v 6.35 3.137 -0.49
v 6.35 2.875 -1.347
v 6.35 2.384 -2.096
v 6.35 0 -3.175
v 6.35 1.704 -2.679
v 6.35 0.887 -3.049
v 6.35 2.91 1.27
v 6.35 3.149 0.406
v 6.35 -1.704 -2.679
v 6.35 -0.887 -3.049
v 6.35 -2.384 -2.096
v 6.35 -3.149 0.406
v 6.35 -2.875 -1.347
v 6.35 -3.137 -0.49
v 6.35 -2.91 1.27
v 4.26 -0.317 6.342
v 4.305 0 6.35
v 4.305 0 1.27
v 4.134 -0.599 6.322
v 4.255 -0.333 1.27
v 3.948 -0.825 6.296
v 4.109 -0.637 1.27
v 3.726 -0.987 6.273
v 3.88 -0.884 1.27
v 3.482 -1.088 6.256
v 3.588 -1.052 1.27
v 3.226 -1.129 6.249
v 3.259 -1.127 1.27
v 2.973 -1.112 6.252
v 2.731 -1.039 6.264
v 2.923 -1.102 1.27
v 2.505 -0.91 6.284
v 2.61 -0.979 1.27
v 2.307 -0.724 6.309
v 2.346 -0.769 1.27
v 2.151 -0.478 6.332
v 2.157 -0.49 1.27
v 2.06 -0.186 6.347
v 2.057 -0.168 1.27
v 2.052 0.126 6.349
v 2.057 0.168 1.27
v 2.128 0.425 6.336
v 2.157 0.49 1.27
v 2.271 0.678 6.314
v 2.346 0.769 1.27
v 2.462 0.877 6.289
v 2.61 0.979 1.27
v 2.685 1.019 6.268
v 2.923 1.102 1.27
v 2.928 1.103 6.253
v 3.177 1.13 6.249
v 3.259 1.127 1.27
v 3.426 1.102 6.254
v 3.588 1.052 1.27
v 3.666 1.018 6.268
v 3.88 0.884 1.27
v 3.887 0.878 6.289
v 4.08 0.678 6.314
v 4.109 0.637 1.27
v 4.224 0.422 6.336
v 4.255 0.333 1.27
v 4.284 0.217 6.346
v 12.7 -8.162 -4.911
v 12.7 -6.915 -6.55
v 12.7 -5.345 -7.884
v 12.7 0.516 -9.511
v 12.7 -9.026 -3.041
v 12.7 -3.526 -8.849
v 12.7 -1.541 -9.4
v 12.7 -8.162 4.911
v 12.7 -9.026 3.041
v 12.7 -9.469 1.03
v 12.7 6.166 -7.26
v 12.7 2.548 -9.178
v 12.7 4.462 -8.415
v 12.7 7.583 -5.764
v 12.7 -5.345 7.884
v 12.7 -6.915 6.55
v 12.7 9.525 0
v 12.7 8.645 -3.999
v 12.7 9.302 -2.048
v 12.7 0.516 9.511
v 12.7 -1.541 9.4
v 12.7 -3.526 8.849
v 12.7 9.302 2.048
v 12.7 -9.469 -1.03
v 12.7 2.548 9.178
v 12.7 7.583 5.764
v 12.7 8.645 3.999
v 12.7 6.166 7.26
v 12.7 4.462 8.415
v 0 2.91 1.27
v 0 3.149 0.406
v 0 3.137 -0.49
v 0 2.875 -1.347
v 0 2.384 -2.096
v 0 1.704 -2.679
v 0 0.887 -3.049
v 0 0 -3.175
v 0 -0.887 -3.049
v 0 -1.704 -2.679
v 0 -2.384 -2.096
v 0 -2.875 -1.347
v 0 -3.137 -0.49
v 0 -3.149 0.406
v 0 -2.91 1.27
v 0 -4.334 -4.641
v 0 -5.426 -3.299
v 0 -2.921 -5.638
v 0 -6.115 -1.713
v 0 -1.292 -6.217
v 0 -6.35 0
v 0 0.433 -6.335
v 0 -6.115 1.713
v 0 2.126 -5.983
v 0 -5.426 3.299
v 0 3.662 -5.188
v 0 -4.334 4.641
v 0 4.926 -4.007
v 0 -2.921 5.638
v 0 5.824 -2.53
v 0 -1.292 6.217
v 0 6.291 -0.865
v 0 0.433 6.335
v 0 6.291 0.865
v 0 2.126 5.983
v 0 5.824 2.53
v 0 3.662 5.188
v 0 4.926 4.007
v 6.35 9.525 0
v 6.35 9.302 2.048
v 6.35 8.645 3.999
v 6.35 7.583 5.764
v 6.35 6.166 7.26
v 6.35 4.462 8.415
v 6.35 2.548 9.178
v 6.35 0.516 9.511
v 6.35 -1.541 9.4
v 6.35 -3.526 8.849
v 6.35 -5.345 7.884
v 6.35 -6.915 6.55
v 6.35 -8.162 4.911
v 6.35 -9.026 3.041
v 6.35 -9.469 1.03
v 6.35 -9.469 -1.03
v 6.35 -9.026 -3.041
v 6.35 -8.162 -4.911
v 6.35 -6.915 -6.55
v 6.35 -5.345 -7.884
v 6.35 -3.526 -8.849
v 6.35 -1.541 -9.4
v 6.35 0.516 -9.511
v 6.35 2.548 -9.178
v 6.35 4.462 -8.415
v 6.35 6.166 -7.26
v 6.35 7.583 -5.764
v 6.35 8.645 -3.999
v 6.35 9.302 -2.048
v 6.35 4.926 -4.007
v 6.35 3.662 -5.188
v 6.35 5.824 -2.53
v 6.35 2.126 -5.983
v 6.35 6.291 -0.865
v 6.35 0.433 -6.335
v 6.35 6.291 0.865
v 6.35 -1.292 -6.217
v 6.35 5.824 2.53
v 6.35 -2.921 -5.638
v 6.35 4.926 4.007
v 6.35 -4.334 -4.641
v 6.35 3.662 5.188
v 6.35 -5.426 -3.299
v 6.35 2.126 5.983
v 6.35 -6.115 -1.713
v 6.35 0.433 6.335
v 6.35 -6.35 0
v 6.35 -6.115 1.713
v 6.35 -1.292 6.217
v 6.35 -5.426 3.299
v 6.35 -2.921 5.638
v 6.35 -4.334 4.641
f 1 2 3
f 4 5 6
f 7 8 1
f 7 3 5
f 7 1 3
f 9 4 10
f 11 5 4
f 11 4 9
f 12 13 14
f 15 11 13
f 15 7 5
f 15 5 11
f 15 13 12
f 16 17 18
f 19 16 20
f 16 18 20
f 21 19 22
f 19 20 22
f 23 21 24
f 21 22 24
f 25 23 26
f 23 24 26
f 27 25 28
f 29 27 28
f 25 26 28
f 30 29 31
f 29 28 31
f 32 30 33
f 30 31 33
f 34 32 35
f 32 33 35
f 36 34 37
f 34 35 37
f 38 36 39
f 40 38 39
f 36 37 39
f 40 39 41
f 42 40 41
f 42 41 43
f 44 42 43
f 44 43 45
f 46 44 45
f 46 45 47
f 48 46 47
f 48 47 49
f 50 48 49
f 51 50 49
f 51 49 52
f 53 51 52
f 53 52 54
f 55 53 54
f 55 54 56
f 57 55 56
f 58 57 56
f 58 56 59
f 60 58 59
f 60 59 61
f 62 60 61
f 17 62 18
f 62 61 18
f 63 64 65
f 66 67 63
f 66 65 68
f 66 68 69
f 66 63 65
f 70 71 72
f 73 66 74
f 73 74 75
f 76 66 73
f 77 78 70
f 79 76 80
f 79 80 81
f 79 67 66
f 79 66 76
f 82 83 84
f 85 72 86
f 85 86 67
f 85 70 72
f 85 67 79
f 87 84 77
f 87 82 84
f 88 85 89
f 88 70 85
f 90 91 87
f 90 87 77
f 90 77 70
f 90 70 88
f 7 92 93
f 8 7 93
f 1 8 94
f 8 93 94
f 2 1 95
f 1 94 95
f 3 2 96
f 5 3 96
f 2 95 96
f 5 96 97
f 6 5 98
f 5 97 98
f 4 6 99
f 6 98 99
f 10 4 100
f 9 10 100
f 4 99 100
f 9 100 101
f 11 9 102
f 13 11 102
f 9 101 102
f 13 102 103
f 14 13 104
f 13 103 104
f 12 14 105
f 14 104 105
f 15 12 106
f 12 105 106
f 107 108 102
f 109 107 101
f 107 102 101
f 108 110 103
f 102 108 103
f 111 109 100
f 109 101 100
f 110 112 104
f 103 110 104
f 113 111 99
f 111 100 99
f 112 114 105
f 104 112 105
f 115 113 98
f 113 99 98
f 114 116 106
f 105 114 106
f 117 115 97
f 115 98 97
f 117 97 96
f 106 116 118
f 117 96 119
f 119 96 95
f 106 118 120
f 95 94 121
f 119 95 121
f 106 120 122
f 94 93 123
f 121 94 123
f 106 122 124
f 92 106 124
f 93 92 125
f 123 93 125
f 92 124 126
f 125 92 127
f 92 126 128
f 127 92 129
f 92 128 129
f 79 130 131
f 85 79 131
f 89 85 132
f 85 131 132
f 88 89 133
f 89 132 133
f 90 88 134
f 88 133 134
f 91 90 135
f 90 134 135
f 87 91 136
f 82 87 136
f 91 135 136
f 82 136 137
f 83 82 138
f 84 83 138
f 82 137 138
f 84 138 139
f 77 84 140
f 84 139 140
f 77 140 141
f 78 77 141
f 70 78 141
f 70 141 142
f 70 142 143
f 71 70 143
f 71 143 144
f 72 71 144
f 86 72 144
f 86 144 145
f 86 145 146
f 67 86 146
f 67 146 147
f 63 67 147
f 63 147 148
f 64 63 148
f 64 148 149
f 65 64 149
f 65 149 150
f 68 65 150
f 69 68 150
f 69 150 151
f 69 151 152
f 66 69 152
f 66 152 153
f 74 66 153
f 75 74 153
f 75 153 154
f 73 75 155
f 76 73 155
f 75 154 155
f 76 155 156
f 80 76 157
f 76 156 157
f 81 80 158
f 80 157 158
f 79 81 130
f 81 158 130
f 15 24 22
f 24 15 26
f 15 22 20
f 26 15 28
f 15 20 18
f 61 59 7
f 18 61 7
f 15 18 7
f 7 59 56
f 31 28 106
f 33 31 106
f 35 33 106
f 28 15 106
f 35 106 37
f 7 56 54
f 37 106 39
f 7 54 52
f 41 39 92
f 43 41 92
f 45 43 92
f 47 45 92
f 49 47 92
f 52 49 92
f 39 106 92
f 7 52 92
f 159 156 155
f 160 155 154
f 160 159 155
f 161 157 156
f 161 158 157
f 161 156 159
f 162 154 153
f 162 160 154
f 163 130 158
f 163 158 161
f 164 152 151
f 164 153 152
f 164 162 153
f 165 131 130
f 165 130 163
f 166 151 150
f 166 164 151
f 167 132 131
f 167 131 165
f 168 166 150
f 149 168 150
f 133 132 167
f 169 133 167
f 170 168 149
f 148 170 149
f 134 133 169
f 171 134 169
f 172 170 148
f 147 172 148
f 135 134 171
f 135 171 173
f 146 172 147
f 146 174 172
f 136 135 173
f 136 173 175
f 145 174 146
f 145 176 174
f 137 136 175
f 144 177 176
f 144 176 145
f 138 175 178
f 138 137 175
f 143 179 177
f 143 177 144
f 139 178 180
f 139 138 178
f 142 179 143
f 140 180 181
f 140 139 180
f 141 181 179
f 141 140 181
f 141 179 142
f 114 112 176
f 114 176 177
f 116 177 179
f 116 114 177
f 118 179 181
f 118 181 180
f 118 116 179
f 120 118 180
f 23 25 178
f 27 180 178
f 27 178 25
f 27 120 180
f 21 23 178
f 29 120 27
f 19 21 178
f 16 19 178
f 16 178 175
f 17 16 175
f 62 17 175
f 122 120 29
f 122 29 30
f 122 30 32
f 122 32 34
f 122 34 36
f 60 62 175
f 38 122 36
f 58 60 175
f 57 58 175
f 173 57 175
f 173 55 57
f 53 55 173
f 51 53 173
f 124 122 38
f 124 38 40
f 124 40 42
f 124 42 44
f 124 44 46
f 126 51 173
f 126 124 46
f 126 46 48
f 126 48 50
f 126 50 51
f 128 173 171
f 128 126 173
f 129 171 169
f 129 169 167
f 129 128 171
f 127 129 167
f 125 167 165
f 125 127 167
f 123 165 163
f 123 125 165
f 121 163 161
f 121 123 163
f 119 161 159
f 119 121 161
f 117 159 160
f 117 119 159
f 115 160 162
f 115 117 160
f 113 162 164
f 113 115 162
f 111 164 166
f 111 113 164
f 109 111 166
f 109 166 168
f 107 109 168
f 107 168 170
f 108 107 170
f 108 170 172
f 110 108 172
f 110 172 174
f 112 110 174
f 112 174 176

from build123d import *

# Parameters (mm, degrees)
F0_R     = 9.525
F1_DEPTH = 12.7
F2_R     = 9.525
F2_R_2   = 6.35
F3_DEPTH = 6.35
F5_DEPTH = 6.35
F7_D     = 2.2606
F7_DEPTH = 8.256


with BuildPart() as f1:
    # F0 (on Right) → F1 (new body)
    with BuildSketch(Plane.YZ):
        Circle(F0_R)
    extrude(amount=F1_DEPTH)

    # F2 (on face) → F3 (cut)
    with BuildSketch(Plane(origin=(0, 0, 0), x_dir=(0, -1, 0), z_dir=(-1, 0, 0))):
        Circle(F2_R)
        Circle(F2_R_2, mode=Mode.SUBTRACT)
    extrude(amount=-F3_DEPTH, mode=Mode.SUBTRACT)

    # F4 (on face) → F5 (cut)
    with BuildSketch(Plane(origin=(0, 0, 0), x_dir=(0, -1, 0), z_dir=(-1, 0, 0))):
        with BuildLine():
            Line((2.9099355663, 1.27), (-2.9099355663, 1.27))
            ThreePointArc((-2.9099355663, 1.27), (0, -3.175), (2.9099355663, 1.27))
        make_face()
    extrude(amount=-F5_DEPTH, mode=Mode.SUBTRACT)

    # F7 (through all, one way)
    with BuildSketch(Plane(origin=(0, 0, 1.27), x_dir=(1, 0, 0), z_dir=(0, 0, -1))):
        with Locations((3.175, 0)):
            Circle(F7_D / 2)
    extrude(amount=-F7_DEPTH, mode=Mode.SUBTRACT)


solid = f1.part
